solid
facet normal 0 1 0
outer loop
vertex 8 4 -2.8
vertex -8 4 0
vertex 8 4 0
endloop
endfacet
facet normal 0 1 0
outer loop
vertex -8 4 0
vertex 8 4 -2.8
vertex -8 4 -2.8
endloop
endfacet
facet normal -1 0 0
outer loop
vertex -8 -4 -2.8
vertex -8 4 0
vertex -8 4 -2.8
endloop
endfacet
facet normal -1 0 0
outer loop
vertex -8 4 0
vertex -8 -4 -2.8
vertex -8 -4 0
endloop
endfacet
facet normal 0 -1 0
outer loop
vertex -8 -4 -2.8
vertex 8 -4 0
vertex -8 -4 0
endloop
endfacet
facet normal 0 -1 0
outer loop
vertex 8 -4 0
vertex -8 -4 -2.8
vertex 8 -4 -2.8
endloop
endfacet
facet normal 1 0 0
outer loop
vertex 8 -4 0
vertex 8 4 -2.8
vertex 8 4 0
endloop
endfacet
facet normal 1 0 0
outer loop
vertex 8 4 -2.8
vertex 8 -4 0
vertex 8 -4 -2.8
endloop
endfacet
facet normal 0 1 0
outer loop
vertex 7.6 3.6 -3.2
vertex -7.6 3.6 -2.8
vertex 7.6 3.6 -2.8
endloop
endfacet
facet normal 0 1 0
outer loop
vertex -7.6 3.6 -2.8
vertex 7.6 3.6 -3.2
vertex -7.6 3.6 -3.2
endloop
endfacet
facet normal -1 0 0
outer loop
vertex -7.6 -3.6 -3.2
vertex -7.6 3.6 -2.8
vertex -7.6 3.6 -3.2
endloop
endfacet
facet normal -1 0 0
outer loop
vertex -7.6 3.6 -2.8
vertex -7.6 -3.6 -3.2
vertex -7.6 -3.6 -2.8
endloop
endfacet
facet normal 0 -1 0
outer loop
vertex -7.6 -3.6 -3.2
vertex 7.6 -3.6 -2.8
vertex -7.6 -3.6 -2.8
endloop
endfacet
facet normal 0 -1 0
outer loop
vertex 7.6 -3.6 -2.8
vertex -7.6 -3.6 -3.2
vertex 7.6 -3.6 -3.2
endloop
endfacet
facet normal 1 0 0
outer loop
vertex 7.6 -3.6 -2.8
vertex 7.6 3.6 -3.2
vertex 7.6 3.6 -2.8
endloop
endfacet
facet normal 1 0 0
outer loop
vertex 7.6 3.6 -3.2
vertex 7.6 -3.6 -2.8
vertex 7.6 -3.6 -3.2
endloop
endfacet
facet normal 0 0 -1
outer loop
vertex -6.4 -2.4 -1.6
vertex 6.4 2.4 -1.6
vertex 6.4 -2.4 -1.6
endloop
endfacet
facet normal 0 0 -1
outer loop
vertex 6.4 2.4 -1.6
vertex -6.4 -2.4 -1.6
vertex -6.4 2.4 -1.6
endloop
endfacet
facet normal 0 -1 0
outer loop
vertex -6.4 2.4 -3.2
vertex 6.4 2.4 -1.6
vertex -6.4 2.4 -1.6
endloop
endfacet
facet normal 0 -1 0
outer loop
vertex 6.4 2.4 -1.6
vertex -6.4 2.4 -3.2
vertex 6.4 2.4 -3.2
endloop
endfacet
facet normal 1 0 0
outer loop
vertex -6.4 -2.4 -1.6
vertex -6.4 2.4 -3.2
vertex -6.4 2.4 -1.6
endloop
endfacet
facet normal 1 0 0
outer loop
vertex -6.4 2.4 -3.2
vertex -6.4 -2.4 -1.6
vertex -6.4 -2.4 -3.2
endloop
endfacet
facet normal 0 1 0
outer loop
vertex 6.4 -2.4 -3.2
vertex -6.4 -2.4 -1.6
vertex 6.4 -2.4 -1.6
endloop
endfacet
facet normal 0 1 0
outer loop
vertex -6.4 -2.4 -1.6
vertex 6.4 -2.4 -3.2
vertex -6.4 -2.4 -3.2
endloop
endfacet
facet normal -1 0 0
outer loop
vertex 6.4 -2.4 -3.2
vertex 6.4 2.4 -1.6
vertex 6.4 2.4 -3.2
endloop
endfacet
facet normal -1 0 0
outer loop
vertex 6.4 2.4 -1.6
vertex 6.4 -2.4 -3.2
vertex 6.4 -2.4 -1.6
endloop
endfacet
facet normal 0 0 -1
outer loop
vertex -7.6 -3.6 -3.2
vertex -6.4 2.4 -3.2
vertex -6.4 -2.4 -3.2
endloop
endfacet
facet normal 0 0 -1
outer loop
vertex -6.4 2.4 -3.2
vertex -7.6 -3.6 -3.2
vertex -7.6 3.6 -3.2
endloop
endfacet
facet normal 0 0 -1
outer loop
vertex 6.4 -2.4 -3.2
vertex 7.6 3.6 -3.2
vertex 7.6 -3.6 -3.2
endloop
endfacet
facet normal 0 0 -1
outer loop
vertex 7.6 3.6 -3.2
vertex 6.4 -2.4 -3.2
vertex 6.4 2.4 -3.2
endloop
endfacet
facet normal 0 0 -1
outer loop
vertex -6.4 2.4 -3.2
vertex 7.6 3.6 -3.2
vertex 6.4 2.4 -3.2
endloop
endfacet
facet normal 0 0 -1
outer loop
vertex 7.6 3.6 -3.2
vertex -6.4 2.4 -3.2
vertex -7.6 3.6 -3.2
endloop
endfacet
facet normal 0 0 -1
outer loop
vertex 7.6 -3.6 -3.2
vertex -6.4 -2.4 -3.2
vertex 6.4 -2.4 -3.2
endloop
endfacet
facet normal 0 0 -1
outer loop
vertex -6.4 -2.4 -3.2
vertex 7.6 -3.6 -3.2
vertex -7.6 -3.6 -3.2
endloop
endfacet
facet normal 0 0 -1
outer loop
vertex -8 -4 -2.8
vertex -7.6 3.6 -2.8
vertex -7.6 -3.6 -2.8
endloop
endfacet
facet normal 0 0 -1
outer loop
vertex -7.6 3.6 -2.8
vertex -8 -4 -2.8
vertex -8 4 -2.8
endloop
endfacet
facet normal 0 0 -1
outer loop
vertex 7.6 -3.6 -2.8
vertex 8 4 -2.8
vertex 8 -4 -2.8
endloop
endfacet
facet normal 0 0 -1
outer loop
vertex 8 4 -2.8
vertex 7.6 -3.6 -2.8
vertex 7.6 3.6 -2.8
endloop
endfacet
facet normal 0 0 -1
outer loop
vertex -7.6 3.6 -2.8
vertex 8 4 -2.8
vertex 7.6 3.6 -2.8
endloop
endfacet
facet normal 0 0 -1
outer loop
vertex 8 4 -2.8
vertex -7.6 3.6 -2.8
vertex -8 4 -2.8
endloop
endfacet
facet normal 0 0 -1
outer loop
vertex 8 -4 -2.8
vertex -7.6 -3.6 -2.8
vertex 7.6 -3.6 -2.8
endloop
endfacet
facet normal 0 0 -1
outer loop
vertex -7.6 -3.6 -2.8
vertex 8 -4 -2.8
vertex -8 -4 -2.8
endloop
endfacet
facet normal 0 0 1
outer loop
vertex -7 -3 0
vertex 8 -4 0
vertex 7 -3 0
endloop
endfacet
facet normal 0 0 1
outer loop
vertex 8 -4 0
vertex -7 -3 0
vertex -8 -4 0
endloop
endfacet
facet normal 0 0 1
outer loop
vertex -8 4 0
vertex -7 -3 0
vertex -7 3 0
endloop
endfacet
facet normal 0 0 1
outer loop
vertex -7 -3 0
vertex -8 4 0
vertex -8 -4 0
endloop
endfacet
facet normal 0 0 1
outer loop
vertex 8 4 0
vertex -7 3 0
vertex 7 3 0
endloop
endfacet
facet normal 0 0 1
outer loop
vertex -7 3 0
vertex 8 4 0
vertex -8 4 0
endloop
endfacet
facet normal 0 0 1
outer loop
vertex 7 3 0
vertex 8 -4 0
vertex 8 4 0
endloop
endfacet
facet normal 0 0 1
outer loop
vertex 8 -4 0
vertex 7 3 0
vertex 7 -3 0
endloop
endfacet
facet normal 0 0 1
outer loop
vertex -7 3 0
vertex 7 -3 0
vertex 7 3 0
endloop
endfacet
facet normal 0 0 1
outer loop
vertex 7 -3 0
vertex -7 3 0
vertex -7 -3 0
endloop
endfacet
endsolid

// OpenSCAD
// file: ../p/box5.scad
use <../lib.scad>
function ldraw_lib__box5() = [
// 0 Box with 5 Faces and All Edges
// 0 Name: box5.dat
// 0 Author: James Jessiman
// 0 !LDRAW_ORG Primitive UPDATE 2012-01
// 0 !LICENSE Licensed under CC BY 2.0 and CC BY 4.0 : see CAreadme.txt
// 
// 0 BFC CERTIFY CCW
  [0,"BFC","CERTIFY"],
  [0,"BFC","CCW"],
// 
// 0 !HISTORY 2002-04-03 [sbliss] Modified for BFC compliance
// 0 !HISTORY 2002-04-25 [PTadmin] Official Update 2002-02
// 0 !HISTORY 2007-06-24 [PTadmin] Header formatted for Contributor Agreement
// 0 !HISTORY 2008-07-01 [PTadmin] Official Update 2008-01
// 0 !HISTORY 2012-02-16 [Philo] Changed to CCW
// 0 !HISTORY 2012-03-30 [PTadmin] Official Update 2012-01
// 
// 
// 2 24 1 1 1 -1 1 1
  [2,24,1,1,1,-1,1,1],
// 2 24 -1 1 1 -1 1 -1
  [2,24,-1,1,1,-1,1,-1],
// 2 24 -1 1 -1 1 1 -1
  [2,24,-1,1,-1,1,1,-1],
// 2 24 1 1 -1 1 1 1
  [2,24,1,1,-1,1,1,1],
// 2 24 1 0 1 -1 0 1
  [2,24,1,0,1,-1,0,1],
// 2 24 -1 0 1 -1 0 -1
  [2,24,-1,0,1,-1,0,-1],
// 2 24 -1 0 -1 1 0 -1
  [2,24,-1,0,-1,1,0,-1],
// 2 24 1 0 -1 1 0 1
  [2,24,1,0,-1,1,0,1],
// 2 24 1 0 1 1 1 1
  [2,24,1,0,1,1,1,1],
// 2 24 -1 0 1 -1 1 1
  [2,24,-1,0,1,-1,1,1],
// 2 24 1 0 -1 1 1 -1
  [2,24,1,0,-1,1,1,-1],
// 2 24 -1 0 -1 -1 1 -1
  [2,24,-1,0,-1,-1,1,-1],
// 4 16 -1 1 1 1 1 1 1 1 -1 -1 1 -1
  [4,16,-1,1,1,1,1,1,1,1,-1,-1,1,-1],
// 4 16 -1 1 1 -1 0 1 1 0 1 1 1 1
  [4,16,-1,1,1,-1,0,1,1,0,1,1,1,1],
// 4 16 -1 1 -1 -1 0 -1 -1 0 1 -1 1 1
  [4,16,-1,1,-1,-1,0,-1,-1,0,1,-1,1,1],
// 4 16 1 1 -1 1 0 -1 -1 0 -1 -1 1 -1
  [4,16,1,1,-1,1,0,-1,-1,0,-1,-1,1,-1],
// 4 16 1 1 1 1 0 1 1 0 -1 1 1 -1
  [4,16,1,1,1,1,0,1,1,0,-1,1,1,-1],
];
makepoly(ldraw_lib__box5(), line=0.2);
// file: ../p/box4.scad
use <../lib.scad>
function ldraw_lib__box4() = [
// 0 Box with 4 Faces (2 Parallel Pairs) and All Edges
// 0 Name: box4.dat
// 0 Author: James Jessiman
// 0 !LDRAW_ORG Primitive UPDATE 2012-01
// 0 !LICENSE Licensed under CC BY 2.0 and CC BY 4.0 : see CAreadme.txt
// 
// 0 BFC CERTIFY CCW
  [0,"BFC","CERTIFY"],
  [0,"BFC","CCW"],
// 
// 0 !HISTORY 2002-04-03 [sbliss] Modified for BFC compliance
// 0 !HISTORY 2002-04-25 [PTadmin] Official Update 2002-02
// 0 !HISTORY 2007-06-24 [PTadmin] Header formatted for Contributor Agreement
// 0 !HISTORY 2008-07-01 [PTadmin] Official Update 2008-01
// 0 !HISTORY 2012-02-16 [Philo] Changed to CCW
// 0 !HISTORY 2012-03-30 [PTadmin] Official Update 2012-01
// 
// 
// 2 24 1 1 1 -1 1 1
  [2,24,1,1,1,-1,1,1],
// 2 24 -1 1 1 -1 1 -1
  [2,24,-1,1,1,-1,1,-1],
// 2 24 -1 1 -1 1 1 -1
  [2,24,-1,1,-1,1,1,-1],
// 2 24 1 1 -1 1 1 1
  [2,24,1,1,-1,1,1,1],
// 2 24 1 0 1 -1 0 1
  [2,24,1,0,1,-1,0,1],
// 2 24 -1 0 1 -1 0 -1
  [2,24,-1,0,1,-1,0,-1],
// 2 24 -1 0 -1 1 0 -1
  [2,24,-1,0,-1,1,0,-1],
// 2 24 1 0 -1 1 0 1
  [2,24,1,0,-1,1,0,1],
// 2 24 1 0 1 1 1 1
  [2,24,1,0,1,1,1,1],
// 2 24 -1 0 1 -1 1 1
  [2,24,-1,0,1,-1,1,1],
// 2 24 1 0 -1 1 1 -1
  [2,24,1,0,-1,1,1,-1],
// 2 24 -1 0 -1 -1 1 -1
  [2,24,-1,0,-1,-1,1,-1],
// 4 16 -1 1 1 -1 0 1 1 0 1 1 1 1
  [4,16,-1,1,1,-1,0,1,1,0,1,1,1,1],
// 4 16 -1 1 -1 -1 0 -1 -1 0 1 -1 1 1
  [4,16,-1,1,-1,-1,0,-1,-1,0,1,-1,1,1],
// 4 16 1 1 -1 1 0 -1 -1 0 -1 -1 1 -1
  [4,16,1,1,-1,1,0,-1,-1,0,-1,-1,1,-1],
// 4 16 1 1 1 1 0 1 1 0 -1 1 1 -1
  [4,16,1,1,1,1,0,1,1,0,-1,1,1,-1],
];
makepoly(ldraw_lib__box4(), line=0.2);
// file: s/3069bs01.scad
use <../../lib.scad>
use <../../p/box4.scad>
use <../../p/box5.scad>
function ldraw_lib__s__3069bs01() = [
// 0 ~Tile  1 x  2 with Groove without Top Face
// 0 Name: s\3069bs01.dat
// 0 Author: Santeri Piippo [arezey]
// 0 !LDRAW_ORG Subpart UPDATE 2010-02
// 0 !LICENSE Licensed under CC BY 2.0 and CC BY 4.0 : see CAreadme.txt
// 
// 0 BFC CERTIFY CCW
  [0,"BFC","CERTIFY"],
  [0,"BFC","CCW"],
// 
// 0 !HISTORY 2010-07-05 [PTadmin] Official Update 2010-02
// 
// 
// 1 16 0 0 0 20 0 0 0 7 0 0 0 10 box4.dat
  [1,16,0,0,0,20,0,0,0,7,0,0,0,10, ldraw_lib__box4()],
// 1 16 0 7 0 19 0 0 0 1 0 0 0 9 box4.dat
  [1,16,0,7,0,19,0,0,0,1,0,0,0,9, ldraw_lib__box4()],
// 0 BFC INVERTNEXT
  [0,"BFC","INVERTNEXT"],
// 1 16 0 8 0 16 0 0 0 -4 0 0 0 6 box5.dat
  [1,16,0,8,0,16,0,0,0,-4,0,0,0,6, ldraw_lib__box5()],
// 4 16 -19 8 9 -16 8 6 -16 8 -6 -19 8 -9
  [4,16,-19,8,9,-16,8,6,-16,8,-6,-19,8,-9],
// 4 16 19 8 -9 16 8 -6 16 8 6 19 8 9
  [4,16,19,8,-9,16,8,-6,16,8,6,19,8,9],
// 4 16 19 8 9 16 8 6 -16 8 6 -19 8 9
  [4,16,19,8,9,16,8,6,-16,8,6,-19,8,9],
// 4 16 -19 8 -9 -16 8 -6 16 8 -6 19 8 -9
  [4,16,-19,8,-9,-16,8,-6,16,8,-6,19,8,-9],
// 4 16 -20 7 10 -19 7 9 -19 7 -9 -20 7 -10
  [4,16,-20,7,10,-19,7,9,-19,7,-9,-20,7,-10],
// 4 16 20 7 -10 19 7 -9 19 7 9 20 7 10
  [4,16,20,7,-10,19,7,-9,19,7,9,20,7,10],
// 4 16 20 7 10 19 7 9 -19 7 9 -20 7 10
  [4,16,20,7,10,19,7,9,-19,7,9,-20,7,10],
// 4 16 -20 7 -10 -19 7 -9 19 7 -9 20 7 -10
  [4,16,-20,7,-10,-19,7,-9,19,7,-9,20,7,-10],
// 0 //
];
makepoly(ldraw_lib__s__3069bs01(), line=0.2);
// main file
use <../lib.scad>
use <s/3069bs01.scad>
function ldraw_lib__3069bpf2() = [
// 0 Tile  1 x  2 with Red Rectangle Pattern
// 0 Name: 3069bpf2.dat
// 0 Author: Niels Karsdorp [nielsk]
// 0 !LDRAW_ORG Part UPDATE 2004-03
// 0 !LICENSE Licensed under CC BY 2.0 and CC BY 4.0 : see CAreadme.txt
// 
// 0 BFC CERTIFY CCW
  [0,"BFC","CERTIFY"],
  [0,"BFC","CCW"],
// 
// 0 !HISTORY 2004-09-15 [PTadmin] Official Update 2004-03
// 0 !HISTORY 2007-06-13 [PTadmin] Header formatted for Contributor Agreement
// 0 !HISTORY 2008-07-01 [PTadmin] Official Update 2008-01
// 
// 
// 1 16 0 0 0 1 0 0 0 1 0 0 0 1 s\3069bs01.dat
  [1,16,0,0,0,1,0,0,0,1,0,0,0,1, ldraw_lib__s__3069bs01()],
// 4 16 -20 0 -10 20 0 -10 17.5 0 -7.5 -17.5 0 -7.5
  [4,16,-20,0,-10,20,0,-10,17.5,0,-7.5,-17.5,0,-7.5],
// 4 16 -20 0 10 -20 0 -10 -17.5 0 -7.5 -17.5 0 7.5
  [4,16,-20,0,10,-20,0,-10,-17.5,0,-7.5,-17.5,0,7.5],
// 4 16 20 0 10 -20 0 10 -17.5 0 7.5 17.5 0 7.5
  [4,16,20,0,10,-20,0,10,-17.5,0,7.5,17.5,0,7.5],
// 4 16 20 0 -10 20 0 10 17.5 0 7.5 17.5 0 -7.5
  [4,16,20,0,-10,20,0,10,17.5,0,7.5,17.5,0,-7.5],
// 4 4 -17.5 0 -7.5 17.5 0 -7.5 17.5 0 7.5 -17.5 0 7.5
  [4,4,-17.5,0,-7.5,17.5,0,-7.5,17.5,0,7.5,-17.5,0,7.5],
// 0
];
makepoly(ldraw_lib__3069bpf2(), line=0.2);
